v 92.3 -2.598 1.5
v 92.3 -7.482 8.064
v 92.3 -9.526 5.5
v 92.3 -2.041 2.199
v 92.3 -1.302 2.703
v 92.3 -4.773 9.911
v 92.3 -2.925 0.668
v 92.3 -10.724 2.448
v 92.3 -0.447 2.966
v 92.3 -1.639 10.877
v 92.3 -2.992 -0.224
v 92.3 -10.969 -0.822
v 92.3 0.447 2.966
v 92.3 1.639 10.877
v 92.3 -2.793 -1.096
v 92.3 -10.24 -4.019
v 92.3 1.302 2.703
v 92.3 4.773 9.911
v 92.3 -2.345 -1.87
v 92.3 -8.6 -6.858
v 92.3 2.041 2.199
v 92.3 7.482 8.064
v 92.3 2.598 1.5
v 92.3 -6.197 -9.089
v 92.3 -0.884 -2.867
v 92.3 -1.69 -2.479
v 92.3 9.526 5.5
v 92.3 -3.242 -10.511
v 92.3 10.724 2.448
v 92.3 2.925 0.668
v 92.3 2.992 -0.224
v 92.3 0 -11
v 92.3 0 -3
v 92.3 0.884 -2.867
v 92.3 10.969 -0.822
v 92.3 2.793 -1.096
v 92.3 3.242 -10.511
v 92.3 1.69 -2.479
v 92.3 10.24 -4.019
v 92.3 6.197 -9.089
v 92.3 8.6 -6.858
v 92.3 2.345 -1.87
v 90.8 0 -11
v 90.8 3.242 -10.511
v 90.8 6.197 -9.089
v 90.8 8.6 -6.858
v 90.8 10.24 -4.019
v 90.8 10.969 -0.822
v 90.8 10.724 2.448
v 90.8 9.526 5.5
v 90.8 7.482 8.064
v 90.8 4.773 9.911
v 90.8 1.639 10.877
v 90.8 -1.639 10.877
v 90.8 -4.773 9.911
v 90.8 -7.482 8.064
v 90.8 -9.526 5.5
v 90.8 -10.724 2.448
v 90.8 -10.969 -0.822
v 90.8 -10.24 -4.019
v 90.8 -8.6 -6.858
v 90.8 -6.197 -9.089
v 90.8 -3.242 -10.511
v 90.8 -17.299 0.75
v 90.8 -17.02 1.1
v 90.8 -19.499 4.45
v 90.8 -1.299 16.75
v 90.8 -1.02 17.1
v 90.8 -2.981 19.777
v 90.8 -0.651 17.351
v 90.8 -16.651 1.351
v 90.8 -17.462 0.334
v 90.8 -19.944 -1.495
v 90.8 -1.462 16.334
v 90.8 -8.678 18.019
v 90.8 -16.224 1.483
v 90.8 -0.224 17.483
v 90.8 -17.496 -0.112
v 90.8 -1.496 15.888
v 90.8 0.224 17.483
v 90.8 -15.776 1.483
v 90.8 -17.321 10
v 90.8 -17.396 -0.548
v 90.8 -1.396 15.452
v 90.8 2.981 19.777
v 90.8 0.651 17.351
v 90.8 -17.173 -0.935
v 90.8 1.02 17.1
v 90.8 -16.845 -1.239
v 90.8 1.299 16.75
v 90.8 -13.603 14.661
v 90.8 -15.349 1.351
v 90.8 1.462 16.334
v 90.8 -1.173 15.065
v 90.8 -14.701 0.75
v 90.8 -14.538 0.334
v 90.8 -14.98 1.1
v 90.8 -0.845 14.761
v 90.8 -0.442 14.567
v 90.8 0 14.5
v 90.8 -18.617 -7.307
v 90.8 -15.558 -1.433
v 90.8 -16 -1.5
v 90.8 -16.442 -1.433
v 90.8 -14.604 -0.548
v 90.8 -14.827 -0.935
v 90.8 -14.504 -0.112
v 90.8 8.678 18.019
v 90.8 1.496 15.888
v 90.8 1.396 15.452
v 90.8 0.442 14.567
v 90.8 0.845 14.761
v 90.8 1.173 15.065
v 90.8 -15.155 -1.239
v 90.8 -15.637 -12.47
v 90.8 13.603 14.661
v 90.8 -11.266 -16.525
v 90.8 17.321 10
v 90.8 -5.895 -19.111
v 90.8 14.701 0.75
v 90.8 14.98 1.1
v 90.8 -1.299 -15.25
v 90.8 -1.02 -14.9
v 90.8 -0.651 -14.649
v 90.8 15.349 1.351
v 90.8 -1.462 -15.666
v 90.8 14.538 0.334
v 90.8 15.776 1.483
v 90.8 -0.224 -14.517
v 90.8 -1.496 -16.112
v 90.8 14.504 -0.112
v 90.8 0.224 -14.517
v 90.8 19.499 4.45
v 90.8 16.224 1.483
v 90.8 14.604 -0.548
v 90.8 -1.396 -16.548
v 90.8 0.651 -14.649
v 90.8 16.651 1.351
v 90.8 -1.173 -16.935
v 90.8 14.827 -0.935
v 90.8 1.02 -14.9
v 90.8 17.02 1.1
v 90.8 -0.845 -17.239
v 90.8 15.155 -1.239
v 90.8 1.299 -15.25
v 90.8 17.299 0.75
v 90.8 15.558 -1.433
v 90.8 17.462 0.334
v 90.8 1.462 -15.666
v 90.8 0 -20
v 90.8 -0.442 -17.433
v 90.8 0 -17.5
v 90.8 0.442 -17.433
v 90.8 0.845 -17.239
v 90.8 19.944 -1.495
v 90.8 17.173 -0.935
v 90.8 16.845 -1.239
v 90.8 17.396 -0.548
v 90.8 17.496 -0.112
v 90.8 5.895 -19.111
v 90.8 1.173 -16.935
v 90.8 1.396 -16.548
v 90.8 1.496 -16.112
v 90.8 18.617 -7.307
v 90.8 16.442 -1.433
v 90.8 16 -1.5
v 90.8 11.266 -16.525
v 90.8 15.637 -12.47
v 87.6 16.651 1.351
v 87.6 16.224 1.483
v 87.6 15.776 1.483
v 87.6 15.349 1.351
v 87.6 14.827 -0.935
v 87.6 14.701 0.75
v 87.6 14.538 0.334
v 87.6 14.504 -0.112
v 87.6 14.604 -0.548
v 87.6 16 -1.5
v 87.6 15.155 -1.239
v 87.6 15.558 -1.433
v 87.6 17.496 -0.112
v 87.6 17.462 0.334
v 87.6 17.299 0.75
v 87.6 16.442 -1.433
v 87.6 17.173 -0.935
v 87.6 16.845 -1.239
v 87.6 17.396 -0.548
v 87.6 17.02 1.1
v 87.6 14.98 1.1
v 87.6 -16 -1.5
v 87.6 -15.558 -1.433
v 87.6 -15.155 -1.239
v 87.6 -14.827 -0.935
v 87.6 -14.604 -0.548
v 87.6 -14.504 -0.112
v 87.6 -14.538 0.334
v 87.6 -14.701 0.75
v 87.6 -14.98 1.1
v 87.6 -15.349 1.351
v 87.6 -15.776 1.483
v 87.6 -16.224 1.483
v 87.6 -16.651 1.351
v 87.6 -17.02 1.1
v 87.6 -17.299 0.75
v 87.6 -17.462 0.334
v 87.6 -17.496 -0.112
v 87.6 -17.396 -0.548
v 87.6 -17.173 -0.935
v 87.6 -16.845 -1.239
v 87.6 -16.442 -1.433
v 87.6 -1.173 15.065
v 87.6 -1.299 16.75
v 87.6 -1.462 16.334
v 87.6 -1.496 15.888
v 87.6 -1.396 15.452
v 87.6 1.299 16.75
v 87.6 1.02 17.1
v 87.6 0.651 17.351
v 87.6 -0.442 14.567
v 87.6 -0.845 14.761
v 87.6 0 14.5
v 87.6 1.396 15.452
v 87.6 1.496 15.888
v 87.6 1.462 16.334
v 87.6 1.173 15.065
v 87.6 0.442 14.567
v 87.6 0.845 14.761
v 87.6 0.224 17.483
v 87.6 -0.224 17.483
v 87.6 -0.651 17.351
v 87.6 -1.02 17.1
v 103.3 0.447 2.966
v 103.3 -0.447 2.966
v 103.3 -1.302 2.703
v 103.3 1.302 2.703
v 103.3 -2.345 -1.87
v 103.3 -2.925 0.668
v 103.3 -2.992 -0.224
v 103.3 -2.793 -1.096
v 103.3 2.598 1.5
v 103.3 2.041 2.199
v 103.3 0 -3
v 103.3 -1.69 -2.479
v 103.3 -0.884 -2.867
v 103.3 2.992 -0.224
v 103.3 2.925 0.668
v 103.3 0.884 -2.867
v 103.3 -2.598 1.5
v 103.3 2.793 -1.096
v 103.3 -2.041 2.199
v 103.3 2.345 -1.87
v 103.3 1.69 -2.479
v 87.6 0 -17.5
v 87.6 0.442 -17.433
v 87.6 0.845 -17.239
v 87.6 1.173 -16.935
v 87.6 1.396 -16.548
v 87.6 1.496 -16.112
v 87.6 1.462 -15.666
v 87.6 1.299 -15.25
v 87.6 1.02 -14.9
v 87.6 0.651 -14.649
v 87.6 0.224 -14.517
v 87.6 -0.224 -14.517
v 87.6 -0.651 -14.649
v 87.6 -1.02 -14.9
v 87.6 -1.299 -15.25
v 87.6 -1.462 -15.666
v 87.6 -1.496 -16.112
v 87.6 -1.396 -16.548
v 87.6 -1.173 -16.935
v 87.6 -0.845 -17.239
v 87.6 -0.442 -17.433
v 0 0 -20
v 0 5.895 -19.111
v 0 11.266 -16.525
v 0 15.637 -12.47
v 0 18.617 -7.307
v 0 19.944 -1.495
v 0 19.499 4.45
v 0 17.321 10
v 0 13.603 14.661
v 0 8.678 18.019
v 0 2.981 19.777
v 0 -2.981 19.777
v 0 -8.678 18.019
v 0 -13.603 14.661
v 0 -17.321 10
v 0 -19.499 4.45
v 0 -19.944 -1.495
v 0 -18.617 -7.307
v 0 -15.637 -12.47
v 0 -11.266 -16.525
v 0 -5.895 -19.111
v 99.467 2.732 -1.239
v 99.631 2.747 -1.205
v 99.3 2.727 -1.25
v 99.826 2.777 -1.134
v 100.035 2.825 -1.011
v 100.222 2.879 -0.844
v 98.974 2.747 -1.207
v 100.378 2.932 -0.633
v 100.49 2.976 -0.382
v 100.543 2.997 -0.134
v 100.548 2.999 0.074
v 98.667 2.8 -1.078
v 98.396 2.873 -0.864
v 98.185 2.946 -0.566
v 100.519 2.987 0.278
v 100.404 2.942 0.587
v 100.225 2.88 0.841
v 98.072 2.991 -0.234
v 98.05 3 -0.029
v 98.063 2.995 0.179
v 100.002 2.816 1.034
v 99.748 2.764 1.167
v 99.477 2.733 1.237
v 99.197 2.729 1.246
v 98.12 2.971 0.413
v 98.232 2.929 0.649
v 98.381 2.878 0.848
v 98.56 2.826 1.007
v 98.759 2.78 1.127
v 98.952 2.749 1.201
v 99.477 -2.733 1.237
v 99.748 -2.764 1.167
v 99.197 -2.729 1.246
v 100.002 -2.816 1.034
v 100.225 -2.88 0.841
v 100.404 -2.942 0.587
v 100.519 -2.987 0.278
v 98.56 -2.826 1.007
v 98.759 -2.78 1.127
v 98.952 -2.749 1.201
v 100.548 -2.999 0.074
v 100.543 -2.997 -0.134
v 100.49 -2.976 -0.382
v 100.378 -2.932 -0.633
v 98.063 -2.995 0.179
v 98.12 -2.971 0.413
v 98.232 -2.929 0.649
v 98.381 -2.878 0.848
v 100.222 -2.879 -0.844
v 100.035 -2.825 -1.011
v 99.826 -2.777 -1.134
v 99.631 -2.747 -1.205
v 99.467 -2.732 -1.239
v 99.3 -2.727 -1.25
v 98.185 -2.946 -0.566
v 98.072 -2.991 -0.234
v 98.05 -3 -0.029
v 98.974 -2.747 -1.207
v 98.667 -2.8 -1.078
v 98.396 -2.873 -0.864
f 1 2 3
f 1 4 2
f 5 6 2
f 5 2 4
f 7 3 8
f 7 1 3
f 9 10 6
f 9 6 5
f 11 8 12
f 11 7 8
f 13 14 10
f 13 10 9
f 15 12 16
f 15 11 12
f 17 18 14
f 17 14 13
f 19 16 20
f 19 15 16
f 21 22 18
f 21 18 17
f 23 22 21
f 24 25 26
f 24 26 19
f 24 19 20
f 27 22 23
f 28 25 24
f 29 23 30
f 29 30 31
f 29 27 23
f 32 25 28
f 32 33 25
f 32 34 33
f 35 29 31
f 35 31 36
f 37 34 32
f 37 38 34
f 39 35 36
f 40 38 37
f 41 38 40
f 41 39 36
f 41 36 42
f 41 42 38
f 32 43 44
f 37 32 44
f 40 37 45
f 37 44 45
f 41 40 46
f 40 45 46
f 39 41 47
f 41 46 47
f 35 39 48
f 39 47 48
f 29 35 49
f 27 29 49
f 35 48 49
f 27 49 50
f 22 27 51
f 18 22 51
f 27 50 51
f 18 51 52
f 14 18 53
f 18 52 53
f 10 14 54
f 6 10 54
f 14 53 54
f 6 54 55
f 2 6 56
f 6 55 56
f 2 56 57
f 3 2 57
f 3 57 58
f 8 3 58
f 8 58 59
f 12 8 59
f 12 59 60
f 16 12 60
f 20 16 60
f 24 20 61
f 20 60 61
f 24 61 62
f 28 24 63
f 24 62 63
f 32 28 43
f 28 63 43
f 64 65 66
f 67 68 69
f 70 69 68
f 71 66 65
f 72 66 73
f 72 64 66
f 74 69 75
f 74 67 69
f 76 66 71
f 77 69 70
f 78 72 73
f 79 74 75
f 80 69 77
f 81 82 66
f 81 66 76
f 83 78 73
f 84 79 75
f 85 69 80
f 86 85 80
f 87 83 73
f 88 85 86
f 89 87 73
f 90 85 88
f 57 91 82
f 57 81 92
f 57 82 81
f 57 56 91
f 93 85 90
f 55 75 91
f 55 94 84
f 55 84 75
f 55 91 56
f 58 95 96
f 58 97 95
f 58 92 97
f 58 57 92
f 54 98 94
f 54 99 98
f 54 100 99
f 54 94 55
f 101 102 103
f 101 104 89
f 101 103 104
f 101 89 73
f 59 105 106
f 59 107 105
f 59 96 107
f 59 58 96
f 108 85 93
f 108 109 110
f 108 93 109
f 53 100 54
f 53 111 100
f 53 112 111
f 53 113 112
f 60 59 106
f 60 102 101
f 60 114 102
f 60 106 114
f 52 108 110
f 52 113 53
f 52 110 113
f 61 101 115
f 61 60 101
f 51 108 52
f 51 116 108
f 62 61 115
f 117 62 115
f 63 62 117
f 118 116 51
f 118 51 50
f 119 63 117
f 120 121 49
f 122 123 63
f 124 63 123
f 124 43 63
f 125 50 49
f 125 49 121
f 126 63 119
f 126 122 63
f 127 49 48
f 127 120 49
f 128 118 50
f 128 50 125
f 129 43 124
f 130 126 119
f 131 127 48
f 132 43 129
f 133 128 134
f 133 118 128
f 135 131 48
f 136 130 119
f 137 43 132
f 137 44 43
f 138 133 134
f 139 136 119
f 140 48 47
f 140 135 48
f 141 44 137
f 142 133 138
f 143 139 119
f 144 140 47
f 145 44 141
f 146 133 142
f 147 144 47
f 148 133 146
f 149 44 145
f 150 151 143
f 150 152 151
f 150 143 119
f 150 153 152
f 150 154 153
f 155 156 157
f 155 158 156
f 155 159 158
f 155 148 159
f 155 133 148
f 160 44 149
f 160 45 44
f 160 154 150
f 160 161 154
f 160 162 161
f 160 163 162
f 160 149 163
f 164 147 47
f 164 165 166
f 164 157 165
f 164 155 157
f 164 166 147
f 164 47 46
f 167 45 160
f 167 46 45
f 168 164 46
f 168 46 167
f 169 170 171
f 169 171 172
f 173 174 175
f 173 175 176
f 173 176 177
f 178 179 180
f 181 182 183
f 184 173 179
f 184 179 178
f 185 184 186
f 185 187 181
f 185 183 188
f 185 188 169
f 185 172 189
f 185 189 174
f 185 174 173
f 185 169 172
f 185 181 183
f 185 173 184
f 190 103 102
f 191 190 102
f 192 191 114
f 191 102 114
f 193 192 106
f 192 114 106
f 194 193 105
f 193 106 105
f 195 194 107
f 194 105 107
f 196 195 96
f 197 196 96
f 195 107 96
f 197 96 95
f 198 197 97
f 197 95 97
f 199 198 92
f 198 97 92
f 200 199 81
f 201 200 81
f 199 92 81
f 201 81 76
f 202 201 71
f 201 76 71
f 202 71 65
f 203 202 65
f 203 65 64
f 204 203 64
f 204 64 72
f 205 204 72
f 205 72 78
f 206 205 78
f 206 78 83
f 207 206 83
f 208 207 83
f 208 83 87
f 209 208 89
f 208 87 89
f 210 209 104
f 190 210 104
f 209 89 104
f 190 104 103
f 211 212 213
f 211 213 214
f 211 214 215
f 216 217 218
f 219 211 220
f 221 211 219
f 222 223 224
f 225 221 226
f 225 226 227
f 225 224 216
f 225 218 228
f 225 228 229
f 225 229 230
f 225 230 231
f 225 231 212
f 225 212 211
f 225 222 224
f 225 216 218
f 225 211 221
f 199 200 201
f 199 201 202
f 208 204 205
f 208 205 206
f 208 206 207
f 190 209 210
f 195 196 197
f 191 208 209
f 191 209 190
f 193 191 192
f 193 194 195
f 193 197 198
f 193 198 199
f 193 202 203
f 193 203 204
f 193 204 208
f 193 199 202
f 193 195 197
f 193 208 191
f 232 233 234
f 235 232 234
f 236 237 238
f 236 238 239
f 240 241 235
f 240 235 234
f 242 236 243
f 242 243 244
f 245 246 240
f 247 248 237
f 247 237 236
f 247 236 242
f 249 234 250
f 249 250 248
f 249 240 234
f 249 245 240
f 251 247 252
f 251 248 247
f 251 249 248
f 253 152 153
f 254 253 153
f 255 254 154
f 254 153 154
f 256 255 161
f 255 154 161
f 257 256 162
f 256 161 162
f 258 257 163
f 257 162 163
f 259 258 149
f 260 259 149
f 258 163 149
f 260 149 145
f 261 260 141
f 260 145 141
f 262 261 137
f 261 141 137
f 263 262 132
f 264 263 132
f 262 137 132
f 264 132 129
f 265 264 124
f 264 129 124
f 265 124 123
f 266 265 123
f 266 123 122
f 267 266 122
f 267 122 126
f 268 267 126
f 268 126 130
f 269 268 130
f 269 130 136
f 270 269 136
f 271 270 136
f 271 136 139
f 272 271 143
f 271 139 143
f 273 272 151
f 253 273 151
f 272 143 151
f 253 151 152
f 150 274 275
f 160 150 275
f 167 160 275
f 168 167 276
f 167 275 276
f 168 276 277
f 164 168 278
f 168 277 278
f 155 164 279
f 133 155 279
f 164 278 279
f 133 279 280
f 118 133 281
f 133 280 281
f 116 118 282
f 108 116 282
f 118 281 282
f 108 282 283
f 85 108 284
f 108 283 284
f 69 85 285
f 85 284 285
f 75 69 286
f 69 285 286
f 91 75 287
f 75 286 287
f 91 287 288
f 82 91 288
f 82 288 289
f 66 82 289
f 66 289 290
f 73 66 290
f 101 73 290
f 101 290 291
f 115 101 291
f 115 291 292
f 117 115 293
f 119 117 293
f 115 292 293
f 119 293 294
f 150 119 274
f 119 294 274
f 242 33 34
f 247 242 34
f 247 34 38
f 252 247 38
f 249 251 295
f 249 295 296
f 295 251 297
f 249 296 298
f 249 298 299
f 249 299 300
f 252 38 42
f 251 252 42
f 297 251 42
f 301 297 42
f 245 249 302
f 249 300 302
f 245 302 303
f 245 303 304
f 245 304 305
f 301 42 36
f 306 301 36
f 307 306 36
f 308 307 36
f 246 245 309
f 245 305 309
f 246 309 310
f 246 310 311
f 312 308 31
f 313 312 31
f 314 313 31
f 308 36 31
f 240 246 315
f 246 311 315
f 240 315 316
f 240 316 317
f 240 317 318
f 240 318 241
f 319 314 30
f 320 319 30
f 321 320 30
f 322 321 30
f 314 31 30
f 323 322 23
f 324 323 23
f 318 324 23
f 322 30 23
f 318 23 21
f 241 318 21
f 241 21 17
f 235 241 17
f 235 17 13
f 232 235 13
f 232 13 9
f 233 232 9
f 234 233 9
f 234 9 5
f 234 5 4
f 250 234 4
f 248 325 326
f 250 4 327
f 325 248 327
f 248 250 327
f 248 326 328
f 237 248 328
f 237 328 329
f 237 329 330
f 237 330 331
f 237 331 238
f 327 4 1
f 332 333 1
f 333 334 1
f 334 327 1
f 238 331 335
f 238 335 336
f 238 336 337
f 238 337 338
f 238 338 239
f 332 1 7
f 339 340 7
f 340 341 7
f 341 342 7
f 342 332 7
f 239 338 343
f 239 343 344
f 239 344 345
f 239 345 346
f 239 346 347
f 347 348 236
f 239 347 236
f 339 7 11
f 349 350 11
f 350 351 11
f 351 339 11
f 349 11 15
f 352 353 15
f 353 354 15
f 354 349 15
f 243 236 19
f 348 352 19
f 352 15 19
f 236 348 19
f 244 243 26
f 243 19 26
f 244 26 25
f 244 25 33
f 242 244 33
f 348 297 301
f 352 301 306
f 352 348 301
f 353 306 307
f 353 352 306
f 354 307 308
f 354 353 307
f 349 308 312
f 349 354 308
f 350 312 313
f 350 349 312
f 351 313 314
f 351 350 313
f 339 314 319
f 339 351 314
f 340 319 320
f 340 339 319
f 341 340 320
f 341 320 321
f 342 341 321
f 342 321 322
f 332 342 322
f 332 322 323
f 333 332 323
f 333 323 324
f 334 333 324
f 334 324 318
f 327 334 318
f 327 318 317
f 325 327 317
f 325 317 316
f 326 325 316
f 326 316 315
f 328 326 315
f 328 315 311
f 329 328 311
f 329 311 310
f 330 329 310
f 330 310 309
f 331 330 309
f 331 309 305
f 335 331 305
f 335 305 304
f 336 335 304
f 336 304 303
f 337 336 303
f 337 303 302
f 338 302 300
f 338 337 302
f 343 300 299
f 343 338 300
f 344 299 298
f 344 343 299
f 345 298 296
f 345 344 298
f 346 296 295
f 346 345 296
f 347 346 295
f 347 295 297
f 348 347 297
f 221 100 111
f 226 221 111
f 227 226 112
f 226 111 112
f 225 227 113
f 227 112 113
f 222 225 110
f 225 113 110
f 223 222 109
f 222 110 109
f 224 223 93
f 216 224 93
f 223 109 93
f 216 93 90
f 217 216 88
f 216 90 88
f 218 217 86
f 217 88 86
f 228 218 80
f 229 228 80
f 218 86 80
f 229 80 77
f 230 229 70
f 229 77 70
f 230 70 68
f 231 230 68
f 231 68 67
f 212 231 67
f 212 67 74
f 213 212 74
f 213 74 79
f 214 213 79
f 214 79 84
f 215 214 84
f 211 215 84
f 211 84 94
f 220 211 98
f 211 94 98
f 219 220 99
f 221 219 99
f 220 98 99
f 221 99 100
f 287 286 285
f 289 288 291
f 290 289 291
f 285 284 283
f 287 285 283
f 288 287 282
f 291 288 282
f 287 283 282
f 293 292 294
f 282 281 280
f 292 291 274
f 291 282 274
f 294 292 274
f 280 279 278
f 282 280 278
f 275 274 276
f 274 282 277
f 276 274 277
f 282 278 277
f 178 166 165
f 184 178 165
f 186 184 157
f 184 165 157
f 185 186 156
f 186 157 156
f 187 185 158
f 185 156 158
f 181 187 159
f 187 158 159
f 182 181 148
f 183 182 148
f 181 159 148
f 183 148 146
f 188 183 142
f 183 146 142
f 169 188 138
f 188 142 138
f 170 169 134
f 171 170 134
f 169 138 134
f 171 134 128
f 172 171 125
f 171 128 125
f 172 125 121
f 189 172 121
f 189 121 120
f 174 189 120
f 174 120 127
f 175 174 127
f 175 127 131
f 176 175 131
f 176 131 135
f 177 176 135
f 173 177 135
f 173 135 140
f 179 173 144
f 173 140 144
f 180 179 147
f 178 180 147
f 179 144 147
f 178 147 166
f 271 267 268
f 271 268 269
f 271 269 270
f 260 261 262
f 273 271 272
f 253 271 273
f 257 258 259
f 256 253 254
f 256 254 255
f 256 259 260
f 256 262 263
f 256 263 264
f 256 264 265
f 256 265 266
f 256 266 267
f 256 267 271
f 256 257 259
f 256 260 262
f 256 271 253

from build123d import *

# Parameters (mm, degrees)
SKETCH1_R               = 20
BOSS_EXTRUDE1_DEPTH     = 90.8
SKETCH2_R               = 11
BOSS_EXTRUDE2_DEPTH     = 1.5
SKETCH3_R               = 1.5
CUT_EXTRUDE1_DEPTH      = 3.2
SKETCH4_R               = 6.5
CUT_EXTRUDE2_DEPTH      = 5
SKETCH5_R               = 3
BOSS_EXTRUDE3_DEPTH     = 16
CUT_EXTRUDE3_DEPTH      = 10
CUT_EXTRUDE3_DEPTH_BACK = 10
SKETCH6_R               = 1.25
BOSS_EXTRUDE4_START     = 5
SKETCH7_R               = 6.5
BOSS_EXTRUDE4_DEPTH     = 5


with BuildPart() as part:
    # Sketch1 → Boss-Extrude1 (new body)
    with BuildSketch(Plane(origin=(0, 0, 0), x_dir=(0, 0, -1), z_dir=(1, 0, 0))):
        Circle(SKETCH1_R)
    extrude(amount=BOSS_EXTRUDE1_DEPTH)

    # Sketch2 → Boss-Extrude2 (add)
    with BuildSketch(Plane(origin=(90.8, 0, 0), x_dir=(0, 0, -1), z_dir=(1, 0, 0))):
        Circle(SKETCH2_R)
    extrude(amount=BOSS_EXTRUDE2_DEPTH)

    # Sketch3 → Cut-Extrude1 (cut)
    with BuildSketch(Plane(origin=(90.8, 0, 0), x_dir=(0, 0, -1), z_dir=(1, 0, 0))):
        with Locations((0, 16)):
            Circle(SKETCH3_R)
        with Locations((16, 0)):
            Circle(SKETCH3_R)
        with Locations((0, -16)):
            Circle(SKETCH3_R)
        with Locations((-16, 0)):
            Circle(SKETCH3_R)
    extrude(amount=-CUT_EXTRUDE1_DEPTH, mode=Mode.SUBTRACT)

    # Sketch4 → Cut-Extrude2 (cut)
    with BuildSketch(Plane(origin=(92.3, 0, 0), x_dir=(0, 0, -1), z_dir=(1, 0, 0))):
        Circle(SKETCH4_R)
    extrude(amount=-CUT_EXTRUDE2_DEPTH, mode=Mode.SUBTRACT)

    # Sketch5 → Boss-Extrude3 (add)
    with BuildSketch(Plane(origin=(87.3, 0, 0), x_dir=(0, 0, -1), z_dir=(1, 0, 0))):
        Circle(SKETCH5_R)
    extrude(amount=BOSS_EXTRUDE3_DEPTH)

    # Sketch6 → Cut-Extrude3 (cut, two sides: drawn at the far end of the back side and taken through both)
    with BuildSketch(Plane(origin=(0, 0, 0), x_dir=(1, 0, 0), z_dir=(0, 1, 0)).offset(-CUT_EXTRUDE3_DEPTH_BACK)):
        with Locations(Location((99.3, 0, 0), (0, 0, 90))):
            Circle(SKETCH6_R)
    extrude(amount=CUT_EXTRUDE3_DEPTH + CUT_EXTRUDE3_DEPTH_BACK, mode=Mode.SUBTRACT)

    # Sketch7 → Boss-Extrude4 (add)
    with BuildSketch(Plane(origin=(87.3, 0, 0), x_dir=(0, 0, -1), z_dir=(1, 0, 0)).offset(BOSS_EXTRUDE4_START)):
        Circle(SKETCH7_R)
    extrude(amount=-BOSS_EXTRUDE4_DEPTH)


solid = part.part
